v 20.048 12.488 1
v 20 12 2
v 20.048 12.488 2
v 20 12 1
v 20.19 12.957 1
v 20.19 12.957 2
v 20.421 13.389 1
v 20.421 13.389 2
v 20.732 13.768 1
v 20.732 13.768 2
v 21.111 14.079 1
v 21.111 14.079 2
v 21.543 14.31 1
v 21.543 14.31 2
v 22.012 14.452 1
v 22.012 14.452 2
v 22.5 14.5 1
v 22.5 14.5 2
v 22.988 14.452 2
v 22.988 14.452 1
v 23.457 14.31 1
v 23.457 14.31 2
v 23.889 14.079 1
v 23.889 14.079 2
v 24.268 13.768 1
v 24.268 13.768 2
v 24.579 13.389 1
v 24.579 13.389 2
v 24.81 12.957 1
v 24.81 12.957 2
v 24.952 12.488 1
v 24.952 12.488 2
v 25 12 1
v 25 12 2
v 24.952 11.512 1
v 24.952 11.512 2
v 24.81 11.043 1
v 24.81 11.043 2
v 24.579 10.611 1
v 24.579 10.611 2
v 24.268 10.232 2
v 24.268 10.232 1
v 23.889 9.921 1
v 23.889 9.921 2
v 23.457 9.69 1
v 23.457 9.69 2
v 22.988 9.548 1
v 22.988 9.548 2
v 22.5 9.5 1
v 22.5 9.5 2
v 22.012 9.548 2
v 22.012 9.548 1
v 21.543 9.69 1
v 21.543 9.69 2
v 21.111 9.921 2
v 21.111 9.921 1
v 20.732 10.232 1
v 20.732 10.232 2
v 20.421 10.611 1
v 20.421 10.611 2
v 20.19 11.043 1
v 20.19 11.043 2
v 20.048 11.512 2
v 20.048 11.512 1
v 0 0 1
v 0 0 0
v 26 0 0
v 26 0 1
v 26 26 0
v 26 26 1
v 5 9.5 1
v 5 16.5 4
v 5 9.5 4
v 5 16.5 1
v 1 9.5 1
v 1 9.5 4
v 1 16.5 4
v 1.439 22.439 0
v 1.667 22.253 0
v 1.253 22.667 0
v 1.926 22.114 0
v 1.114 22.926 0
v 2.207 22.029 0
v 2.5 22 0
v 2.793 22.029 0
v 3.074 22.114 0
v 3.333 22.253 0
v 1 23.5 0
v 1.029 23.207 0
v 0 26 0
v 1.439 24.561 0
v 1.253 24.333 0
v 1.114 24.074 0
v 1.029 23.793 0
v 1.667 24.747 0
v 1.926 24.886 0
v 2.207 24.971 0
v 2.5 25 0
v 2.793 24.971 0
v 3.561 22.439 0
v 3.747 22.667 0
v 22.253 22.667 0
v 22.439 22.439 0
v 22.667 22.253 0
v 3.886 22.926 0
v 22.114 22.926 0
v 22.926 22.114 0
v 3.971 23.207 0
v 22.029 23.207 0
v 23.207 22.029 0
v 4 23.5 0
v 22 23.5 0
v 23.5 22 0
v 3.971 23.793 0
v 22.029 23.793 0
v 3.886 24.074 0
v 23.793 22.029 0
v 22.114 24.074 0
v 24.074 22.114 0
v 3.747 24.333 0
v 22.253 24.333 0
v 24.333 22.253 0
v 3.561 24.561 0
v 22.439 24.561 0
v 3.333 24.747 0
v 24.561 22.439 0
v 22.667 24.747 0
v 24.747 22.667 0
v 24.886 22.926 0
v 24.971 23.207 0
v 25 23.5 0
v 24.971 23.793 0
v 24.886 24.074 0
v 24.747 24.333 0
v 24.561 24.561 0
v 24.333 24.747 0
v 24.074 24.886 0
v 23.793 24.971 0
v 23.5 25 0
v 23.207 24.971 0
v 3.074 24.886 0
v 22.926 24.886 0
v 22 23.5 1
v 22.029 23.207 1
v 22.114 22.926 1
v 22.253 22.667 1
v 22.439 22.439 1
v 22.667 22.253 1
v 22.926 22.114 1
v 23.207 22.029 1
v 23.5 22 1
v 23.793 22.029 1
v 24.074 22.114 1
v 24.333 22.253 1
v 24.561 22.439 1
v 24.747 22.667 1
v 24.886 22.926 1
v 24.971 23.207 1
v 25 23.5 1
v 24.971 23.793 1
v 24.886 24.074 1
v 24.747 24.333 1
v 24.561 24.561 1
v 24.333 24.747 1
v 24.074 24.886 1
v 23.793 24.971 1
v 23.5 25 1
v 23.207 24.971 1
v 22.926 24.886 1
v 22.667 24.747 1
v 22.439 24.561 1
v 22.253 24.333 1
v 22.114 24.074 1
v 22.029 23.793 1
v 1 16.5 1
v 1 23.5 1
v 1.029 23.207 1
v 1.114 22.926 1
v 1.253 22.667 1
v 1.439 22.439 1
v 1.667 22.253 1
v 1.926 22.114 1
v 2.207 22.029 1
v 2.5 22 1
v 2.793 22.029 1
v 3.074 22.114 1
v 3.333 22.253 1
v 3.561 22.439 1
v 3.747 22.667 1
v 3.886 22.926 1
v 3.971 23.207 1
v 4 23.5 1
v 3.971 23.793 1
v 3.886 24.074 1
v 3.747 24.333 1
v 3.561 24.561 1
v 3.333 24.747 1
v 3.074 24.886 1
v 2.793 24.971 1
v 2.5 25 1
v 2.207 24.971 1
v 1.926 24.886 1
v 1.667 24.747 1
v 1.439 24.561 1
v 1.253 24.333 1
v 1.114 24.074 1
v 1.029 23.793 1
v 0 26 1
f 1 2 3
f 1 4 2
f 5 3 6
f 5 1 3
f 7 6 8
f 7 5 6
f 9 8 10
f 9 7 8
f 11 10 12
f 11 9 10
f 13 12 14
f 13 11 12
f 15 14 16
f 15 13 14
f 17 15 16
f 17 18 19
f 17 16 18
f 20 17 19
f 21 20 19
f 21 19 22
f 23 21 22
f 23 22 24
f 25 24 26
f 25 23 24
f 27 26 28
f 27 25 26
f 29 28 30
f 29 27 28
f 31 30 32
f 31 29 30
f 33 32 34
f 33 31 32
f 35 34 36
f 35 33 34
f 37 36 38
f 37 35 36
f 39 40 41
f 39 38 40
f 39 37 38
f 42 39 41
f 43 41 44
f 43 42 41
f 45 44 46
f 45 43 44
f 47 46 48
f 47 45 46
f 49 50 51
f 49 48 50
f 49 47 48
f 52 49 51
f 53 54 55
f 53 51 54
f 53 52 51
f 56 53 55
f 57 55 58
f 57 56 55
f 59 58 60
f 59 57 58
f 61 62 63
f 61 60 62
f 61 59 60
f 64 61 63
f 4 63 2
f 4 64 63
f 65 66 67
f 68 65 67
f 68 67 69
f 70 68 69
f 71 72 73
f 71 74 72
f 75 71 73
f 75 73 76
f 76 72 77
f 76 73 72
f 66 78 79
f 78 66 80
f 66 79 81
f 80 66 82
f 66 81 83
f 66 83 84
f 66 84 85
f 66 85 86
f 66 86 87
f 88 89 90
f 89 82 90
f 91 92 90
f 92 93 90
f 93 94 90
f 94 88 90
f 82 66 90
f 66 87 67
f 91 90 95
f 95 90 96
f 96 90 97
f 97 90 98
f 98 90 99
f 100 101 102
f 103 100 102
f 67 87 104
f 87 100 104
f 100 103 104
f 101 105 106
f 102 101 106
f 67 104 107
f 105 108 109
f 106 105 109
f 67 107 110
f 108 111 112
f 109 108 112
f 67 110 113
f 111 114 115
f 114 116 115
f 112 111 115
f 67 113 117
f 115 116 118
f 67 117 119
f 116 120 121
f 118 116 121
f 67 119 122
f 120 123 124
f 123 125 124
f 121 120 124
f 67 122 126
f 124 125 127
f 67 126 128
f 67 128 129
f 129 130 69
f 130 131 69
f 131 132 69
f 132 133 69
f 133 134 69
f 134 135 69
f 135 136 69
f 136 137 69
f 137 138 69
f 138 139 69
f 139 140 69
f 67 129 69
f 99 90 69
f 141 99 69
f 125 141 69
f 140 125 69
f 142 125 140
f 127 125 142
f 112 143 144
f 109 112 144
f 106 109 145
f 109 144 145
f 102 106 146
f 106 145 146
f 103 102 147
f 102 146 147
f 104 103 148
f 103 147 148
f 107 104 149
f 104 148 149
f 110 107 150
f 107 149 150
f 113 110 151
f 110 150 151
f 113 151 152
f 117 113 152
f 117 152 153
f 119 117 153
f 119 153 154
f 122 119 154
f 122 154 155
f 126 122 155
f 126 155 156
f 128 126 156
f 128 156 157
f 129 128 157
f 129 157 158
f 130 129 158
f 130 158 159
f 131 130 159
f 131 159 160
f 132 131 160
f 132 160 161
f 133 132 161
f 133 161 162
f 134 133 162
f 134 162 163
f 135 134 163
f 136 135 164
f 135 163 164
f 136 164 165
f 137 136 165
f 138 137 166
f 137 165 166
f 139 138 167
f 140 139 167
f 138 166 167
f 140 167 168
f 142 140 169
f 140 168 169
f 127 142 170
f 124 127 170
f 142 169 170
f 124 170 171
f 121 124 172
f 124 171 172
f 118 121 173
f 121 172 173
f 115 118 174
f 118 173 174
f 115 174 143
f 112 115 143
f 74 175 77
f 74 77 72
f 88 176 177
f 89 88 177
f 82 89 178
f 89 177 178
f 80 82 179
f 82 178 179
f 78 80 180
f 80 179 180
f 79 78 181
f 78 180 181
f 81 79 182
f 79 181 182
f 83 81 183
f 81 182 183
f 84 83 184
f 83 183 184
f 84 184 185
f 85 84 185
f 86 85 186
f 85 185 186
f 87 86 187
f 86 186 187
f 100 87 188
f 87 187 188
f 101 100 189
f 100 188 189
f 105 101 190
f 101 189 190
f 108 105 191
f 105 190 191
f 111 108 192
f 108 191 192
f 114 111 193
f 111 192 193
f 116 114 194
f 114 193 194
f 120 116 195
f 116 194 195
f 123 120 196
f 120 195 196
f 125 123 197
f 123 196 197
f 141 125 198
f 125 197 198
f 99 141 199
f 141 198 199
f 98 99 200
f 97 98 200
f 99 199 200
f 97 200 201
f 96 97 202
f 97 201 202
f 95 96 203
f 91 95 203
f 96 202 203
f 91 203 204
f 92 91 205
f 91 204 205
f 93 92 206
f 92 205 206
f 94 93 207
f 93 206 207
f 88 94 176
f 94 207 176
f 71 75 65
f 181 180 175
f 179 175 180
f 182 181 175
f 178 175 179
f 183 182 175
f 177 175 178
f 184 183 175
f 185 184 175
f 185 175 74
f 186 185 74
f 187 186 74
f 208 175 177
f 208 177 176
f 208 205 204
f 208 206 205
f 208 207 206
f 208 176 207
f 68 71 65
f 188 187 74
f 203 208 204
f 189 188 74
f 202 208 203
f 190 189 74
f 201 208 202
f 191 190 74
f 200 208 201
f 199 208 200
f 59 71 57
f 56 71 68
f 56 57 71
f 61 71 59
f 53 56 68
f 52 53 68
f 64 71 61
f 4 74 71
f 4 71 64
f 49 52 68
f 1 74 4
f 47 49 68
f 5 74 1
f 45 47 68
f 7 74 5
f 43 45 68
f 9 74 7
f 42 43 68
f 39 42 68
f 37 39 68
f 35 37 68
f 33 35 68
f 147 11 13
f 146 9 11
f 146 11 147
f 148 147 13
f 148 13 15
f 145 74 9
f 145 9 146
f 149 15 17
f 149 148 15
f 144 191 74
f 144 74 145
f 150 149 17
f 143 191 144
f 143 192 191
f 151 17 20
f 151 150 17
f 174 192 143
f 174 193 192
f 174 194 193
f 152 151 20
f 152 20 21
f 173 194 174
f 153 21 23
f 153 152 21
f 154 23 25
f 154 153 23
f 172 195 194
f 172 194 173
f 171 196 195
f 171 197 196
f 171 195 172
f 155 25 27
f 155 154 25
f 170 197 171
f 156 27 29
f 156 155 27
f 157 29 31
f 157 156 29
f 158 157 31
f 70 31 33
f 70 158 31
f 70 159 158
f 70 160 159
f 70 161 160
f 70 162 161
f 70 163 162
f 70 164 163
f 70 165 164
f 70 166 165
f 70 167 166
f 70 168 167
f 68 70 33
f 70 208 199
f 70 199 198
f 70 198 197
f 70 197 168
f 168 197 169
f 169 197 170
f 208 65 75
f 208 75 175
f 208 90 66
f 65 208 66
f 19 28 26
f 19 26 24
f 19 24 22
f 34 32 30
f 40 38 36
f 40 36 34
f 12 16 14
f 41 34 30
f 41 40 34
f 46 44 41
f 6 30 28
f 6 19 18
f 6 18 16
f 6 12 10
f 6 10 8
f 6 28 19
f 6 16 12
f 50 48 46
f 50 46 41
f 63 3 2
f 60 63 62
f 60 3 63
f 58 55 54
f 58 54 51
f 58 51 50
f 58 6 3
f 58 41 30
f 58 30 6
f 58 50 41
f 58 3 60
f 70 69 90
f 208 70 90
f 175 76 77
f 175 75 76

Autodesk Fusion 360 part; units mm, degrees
sketch "Sketch1" plane through (0, 0, 0) normal (0, 0, 1) x (1, 0, 0)
  line L0 (0, 0) -> (26, 0)
  line L1 (26, 0) -> (26, 26)
  line L2 (26, 26) -> (0, 26)
  line L3 (0, 26) -> (0, 0)
  dimension "d1" = 26
  dimension "d2" = 26
extrude "Extrude1" add sketch "Sketch1" along normal blind 1
sketch "Sketch2" plane through (0, 0, 1) normal (0, 0, 1) x (-1, 0, 0)
  line L0 (0, -26) -> (0, 0)
  line L1 (0, 0) -> (-26, 0)
  line L2 (-26, 0) -> (-26, -26)
  line L3 (-26, -26) -> (0, -26)
  circle A0 centre (-23.5, -23.5) radius 1.5
  circle A1 centre (-2.5, -23.5) radius 1.5
  dimension "d5" = 3
  dimension "d6" = 3
  dimension "d7" = 2.5
  dimension "d8" = 2.5
  dimension "d9" = 2.5
  dimension "d10" = 2.5
extrude "Extrude2" cut sketch "Sketch2" against normal blind 4 contours A0 | A1
sketch "Sketch3" plane through (0, 0, 1) normal (0, 0, 1) x (-1, 0, 0)
  circle A0 centre (-2.5, -23.5) radius 1.5
  circle A1 centre (-23.5, -23.5) radius 1.5
  line L0 (0, -26) -> (0, 0)
  line L1 (0, 0) -> (-26, 0)
  line L2 (-26, 0) -> (-26, -26)
  line L3 (-26, -26) -> (0, -26)
  line L4 (-1, -16.5) -> (-5, -16.5)
  line L5 (-5, -16.5) -> (-5, -9.5)
  line L6 (-5, -9.5) -> (-1, -9.5)
  line L7 (-1, -9.5) -> (-1, -16.5)
  dimension "d13" = 7
  dimension "d14" = 4
  dimension "d15" = 1
extrude "Extrude3" add sketch "Sketch3" along normal blind 3 contours L4 L5 L6 L7
sketch "Sketch4" plane through (0, 0, 1) normal (0, 0, 1) x (-1, 0, 0)
  line L0 (-1, -9.5) -> (-1, -16.5)
  line L1 (-1, -16.5) -> (-5, -16.5)
  line L2 (-5, -16.5) -> (-5, -9.5)
  line L3 (-5, -9.5) -> (-1, -9.5)
  circle A0 centre (-2.5, -23.5) radius 1.5
  circle A1 centre (-23.5, -23.5) radius 1.5
  line L4 (0, -26) -> (0, 0)
  line L5 (0, 0) -> (-26, 0)
  line L6 (-26, 0) -> (-26, -26)
  line L7 (-26, -26) -> (0, -26)
  circle A2 centre (-22.5, -12) radius 2.5
  dimension "d19" = 5
  dimension "d20" = 3.5
extrude "Extrude4" add sketch "Sketch4" along normal blind 1 contours A2
